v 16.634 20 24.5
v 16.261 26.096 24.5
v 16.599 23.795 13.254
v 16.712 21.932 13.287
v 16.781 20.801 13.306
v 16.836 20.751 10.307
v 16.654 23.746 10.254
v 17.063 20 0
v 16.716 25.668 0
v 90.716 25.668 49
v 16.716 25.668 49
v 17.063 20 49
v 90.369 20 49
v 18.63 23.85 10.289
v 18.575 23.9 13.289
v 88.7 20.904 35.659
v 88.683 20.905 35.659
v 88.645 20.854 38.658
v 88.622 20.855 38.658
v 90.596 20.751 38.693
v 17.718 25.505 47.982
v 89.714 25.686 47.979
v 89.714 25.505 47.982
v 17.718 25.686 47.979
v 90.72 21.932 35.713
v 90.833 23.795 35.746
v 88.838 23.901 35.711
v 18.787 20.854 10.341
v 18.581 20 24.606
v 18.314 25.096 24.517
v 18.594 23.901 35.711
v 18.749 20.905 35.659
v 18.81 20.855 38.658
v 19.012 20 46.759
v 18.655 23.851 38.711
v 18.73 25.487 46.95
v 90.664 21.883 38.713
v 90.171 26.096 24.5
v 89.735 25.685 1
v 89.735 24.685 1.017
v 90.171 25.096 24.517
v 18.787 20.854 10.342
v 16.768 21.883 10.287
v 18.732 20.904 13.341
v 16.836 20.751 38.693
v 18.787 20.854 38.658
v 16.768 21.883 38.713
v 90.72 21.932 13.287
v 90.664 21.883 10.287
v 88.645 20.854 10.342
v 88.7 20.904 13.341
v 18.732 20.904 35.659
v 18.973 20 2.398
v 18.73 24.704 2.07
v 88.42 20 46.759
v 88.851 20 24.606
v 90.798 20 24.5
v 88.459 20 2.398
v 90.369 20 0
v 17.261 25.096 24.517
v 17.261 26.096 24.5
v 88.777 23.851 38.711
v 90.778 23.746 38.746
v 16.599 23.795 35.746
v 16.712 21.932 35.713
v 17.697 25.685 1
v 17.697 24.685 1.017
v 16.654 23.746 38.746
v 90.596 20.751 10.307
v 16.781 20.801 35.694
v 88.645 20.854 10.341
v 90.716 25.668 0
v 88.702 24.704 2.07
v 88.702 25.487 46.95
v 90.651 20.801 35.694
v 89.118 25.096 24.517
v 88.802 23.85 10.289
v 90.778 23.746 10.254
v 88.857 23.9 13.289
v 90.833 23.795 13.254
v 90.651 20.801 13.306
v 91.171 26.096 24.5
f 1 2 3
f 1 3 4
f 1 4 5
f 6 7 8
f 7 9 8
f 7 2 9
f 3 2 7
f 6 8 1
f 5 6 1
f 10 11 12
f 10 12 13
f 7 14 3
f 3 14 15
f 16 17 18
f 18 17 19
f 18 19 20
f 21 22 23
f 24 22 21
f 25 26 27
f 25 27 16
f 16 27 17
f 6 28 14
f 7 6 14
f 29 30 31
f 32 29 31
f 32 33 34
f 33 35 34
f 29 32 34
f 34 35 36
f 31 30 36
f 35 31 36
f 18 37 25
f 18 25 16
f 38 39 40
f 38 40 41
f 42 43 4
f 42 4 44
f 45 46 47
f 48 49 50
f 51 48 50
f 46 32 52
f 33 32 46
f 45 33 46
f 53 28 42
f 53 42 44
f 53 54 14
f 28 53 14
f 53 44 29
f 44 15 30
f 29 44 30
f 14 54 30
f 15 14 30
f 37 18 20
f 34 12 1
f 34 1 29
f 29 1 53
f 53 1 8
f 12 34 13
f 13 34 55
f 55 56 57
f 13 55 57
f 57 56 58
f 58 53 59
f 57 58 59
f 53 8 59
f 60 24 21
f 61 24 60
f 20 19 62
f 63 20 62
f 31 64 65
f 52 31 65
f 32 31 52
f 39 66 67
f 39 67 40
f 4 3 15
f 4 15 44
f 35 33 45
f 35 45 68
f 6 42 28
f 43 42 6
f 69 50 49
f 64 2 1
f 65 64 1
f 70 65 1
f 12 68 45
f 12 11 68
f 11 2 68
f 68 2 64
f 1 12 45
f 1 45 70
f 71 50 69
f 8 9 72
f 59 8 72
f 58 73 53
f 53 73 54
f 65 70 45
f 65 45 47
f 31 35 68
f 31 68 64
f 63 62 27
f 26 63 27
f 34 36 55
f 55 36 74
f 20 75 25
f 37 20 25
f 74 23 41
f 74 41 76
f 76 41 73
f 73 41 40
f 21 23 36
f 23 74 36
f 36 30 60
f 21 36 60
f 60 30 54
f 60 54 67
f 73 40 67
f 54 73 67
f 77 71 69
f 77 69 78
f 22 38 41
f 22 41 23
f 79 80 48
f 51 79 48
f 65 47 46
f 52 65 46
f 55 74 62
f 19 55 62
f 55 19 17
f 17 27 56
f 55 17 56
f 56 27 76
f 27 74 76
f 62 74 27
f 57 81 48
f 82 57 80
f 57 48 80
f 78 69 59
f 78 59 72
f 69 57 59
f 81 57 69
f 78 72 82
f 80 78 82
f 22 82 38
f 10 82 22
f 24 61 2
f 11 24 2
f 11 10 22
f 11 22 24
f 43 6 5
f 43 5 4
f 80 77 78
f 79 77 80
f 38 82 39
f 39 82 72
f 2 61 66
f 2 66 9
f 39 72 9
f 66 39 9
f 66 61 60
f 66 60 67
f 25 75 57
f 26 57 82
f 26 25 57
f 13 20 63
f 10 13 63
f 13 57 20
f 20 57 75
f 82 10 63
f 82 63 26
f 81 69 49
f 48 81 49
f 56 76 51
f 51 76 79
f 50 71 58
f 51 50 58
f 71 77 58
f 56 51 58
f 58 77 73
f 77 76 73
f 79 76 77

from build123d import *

# Parameters (mm, degrees)
EXTRUDE_1_DEPTH          = 24.5
EXTRUDE_1_DRAFT          = -1
CUT_EXTRUDE_1_REACH      = 120.659
CUT_EXTRUDE_1_DRAFT      = -3
CUT_EXTRUDE_5_DEPTH      = 1
CUT_EXTRUDE_6_DEPTH      = 3
EXTRUDE_2_DEPTH          = 3
MIRROR_6_COPY_1_DEPTH    = 3
MIRROR_6_COPY_2_DEPTH    = 3
SKETCH_16_W              = 97.890152637
SKETCH_16_H              = 76.040955573
CUT_EXTRUDE_7_DEPTH      = 20
CUT_EXTRUDE_7_DEPTH_BACK = 109.33314876


with BuildPart() as part:
    # Sketch 1 → Extrude 1 (with draft: the straight prism first)
    with BuildSketch(Plane.XY):
        Polygon((16.715993843, 25.667879294), (20.215993843, -31.556614873), (87.215993843, -31.556614873), (90.715993843, 25.667879294), align=None)
    extrude(amount=EXTRUDE_1_DEPTH)
    # Extrude 1: the draft: its side faces are tilted about the plane it starts from
    extrude_1_sides = [part.faces().sort_by_distance(p)[0] for p in [
        (18.465993843, -2.94436779, 12.25),
        (53.715993843, -31.556614873, 12.25),
        (88.965993843, -2.94436779, 12.25),
        (53.715993843, 25.667879294, 12.25),
    ]]
    draft(extrude_1_sides, Plane.XY, EXTRUDE_1_DRAFT)

    # Mirror 3: part across plane


with BuildPart() as part_1:
    add(part.part)
    add(part.part.mirror(Plane.XY.offset(24.5)))

    # Cut-Extrude 1: up to this plane
    cut_extrude_1_end = Plane(origin=(20.215993843, -29.556919482, 0.034904813), z_dir=(0, -0.9998476951563913, -0.01745240643728355))



with BuildPart() as cut_extrude_1_long_prism_1:
    # Sketch 2 → Cut-Extrude 1 (the long prism of profile 1, to be tilted and cut off)
    with BuildSketch(Plane(origin=(0, 25.660061204, -0.447898034), x_dir=(1, 0, 0), z_dir=(0, 0.9998476951563913, -0.01745240643728355))):
        Polygon((18.678866318, -47.440503324), (88.753121369, -47.440503324), (89.170598215, -24.951698299), (88.753098752, -2.447966262), (18.678888935, -2.447966262), (18.261389472, -24.951698299), align=None)
    extrude(amount=-CUT_EXTRUDE_1_REACH)
    cut_extrude_1_tool1_sides = [cut_extrude_1_long_prism_1.faces().sort_by_distance(p)[0] for p in [
        (53.715993843, -33.832299375, 48.038274826),
        (88.961859792, -34.028541258, 36.79558489),
        (88.961848484, -34.42115528, 14.302742649),
        (53.715993843, -34.617527418, 3.052590344),
        (18.470139203, -34.42115528, 14.302742649),
        (18.470127895, -34.028541258, 36.79558489),
    ]]
    draft(cut_extrude_1_tool1_sides, Plane(origin=(0, 25.660061204, -0.447898034), x_dir=(1, 0, 0), z_dir=(0, 0.9998476951563913, -0.01745240643728355)), CUT_EXTRUDE_1_DRAFT)  # the draft: side faces tilted about the start plane


with BuildPart() as part_2:
    add(part_1.part)
    cut_extrude_1_tool1 = split(cut_extrude_1_long_prism_1.part, bisect_by=cut_extrude_1_end, keep=Keep.BOTH, mode=Mode.PRIVATE)
    add(cut_extrude_1_tool1.solids().sort_by_distance((53.715994, 26.095398, 24.492555))[0], mode=Mode.SUBTRACT)

    # Sketch 10 → Cut-Extrude 5 (cut)
    with BuildSketch(Plane(origin=(0, 25.660061204, -0.447898034), x_dir=(1, 0, 0), z_dir=(0, 0.9998476951563913, -0.01745240643728355))):
        Polygon((17.697441389, -1.447966262), (89.734546298, -1.447966262), (90.170598215, -24.951698299), (89.714394373, -48.419962311), (17.717593314, -48.419962311), (17.261389472, -24.951698299), align=None)
    extrude(amount=-CUT_EXTRUDE_5_DEPTH, mode=Mode.SUBTRACT)

    # Sketch 13 → Cut-Extrude 6 (cut, symmetric)
    with BuildSketch(Plane(origin=(87.093192584, -4.592650432, -1.535873606), x_dir=(0.017583201594826382, -0.0009272079251698135, 0.999844973636983), z_dir=(-0.998457718176913, 0.05265127083073426, 0.017607631665297937))):
        Polygon((14.826718303, 28.545615626), (14.87901891, 25.545615626), (11.87901891, 25.493315019), (11.826718303, 28.493315019), align=None)
    cut_extrude_6 = extrude(amount=CUT_EXTRUDE_6_DEPTH, both=True, mode=Mode.SUBTRACT)

    # Sketch 14 → Extrude 2 (add)
    with BuildSketch(Plane(origin=(0.283433717, 0.252501642, 15.317338252), x_dir=(-0.9998288893890833, 0.00030489955637755267, 0.018495917907816833), z_dir=(-0.018498430825131588, -0.016479634824702716, -0.9996930677428209))):
        Polygon((-88.431728934, 20.680996021), (-90.383068209, 20.578695502), (-90.452019303, 21.71033965), align=None)
    extrude_2 = extrude(amount=EXTRUDE_2_DEPTH)

    # Mirror 4: Cut-Extrude 6, Extrude 2 across plane
    add(cut_extrude_6.mirror(Plane(origin=(53.715993843, 0, 0), x_dir=(0, 0, 1), z_dir=(1, 0, 0))), mode=Mode.SUBTRACT)
    add(extrude_2.mirror(Plane(origin=(53.715993843, 0, 0), x_dir=(0, 0, 1), z_dir=(1, 0, 0))))

    # Mirror 6: Cut-Extrude 6, Extrude 2 across plane
    add(cut_extrude_6.mirror(Plane.XY.offset(24.5)), mode=Mode.SUBTRACT)
    add(extrude_2.mirror(Plane.XY.offset(24.5)))

    # Mirror 6 copy 1 sketch → Mirror 6 copy 1 (cut, symmetric)
    with BuildSketch(Plane(origin=(20.338795103, -4.592650432, 50.535873606), x_dir=(-0.017583201594826382, -0.0009272079251698135, -0.999844973636983), z_dir=(0.998457718176913, 0.05265127083073426, -0.017607631665297937))):
        Polygon((14.826718303, 28.545615626), (14.87901891, 25.545615626), (11.87901891, 25.493315019), (11.826718303, 28.493315019), align=None)
    extrude(amount=MIRROR_6_COPY_1_DEPTH, both=True, mode=Mode.SUBTRACT)

    # Mirror 6 copy 2 sketch → Mirror 6 copy 2 (add)
    with BuildSketch(Plane(origin=(107.14855397, 0.252501642, 33.682661748), x_dir=(0.9998288893890833, 0.00030489955637755267, -0.018495917907816833), z_dir=(0.018498430825131588, -0.016479634824702716, 0.9996930677428209))):
        Polygon((-88.431728934, 20.680996021), (-90.383068209, 20.578695502), (-90.452019303, 21.71033965), align=None)
    extrude(amount=MIRROR_6_COPY_2_DEPTH)

    # Sketch 16 → Cut-Extrude 7 (cut, two sides)
    with BuildSketch(Plane(origin=(0, 0, 0), x_dir=(1, 0, 0), z_dir=(0, 1, 0))) as cut_extrude_7_sk:
        with Locations((56.945180684, -27.590511427)):
            Rectangle(SKETCH_16_W, SKETCH_16_H)
    extrude(amount=CUT_EXTRUDE_7_DEPTH, mode=Mode.SUBTRACT)
    extrude(cut_extrude_7_sk.sketch, amount=-CUT_EXTRUDE_7_DEPTH_BACK, mode=Mode.SUBTRACT)


solid = part_2.part
